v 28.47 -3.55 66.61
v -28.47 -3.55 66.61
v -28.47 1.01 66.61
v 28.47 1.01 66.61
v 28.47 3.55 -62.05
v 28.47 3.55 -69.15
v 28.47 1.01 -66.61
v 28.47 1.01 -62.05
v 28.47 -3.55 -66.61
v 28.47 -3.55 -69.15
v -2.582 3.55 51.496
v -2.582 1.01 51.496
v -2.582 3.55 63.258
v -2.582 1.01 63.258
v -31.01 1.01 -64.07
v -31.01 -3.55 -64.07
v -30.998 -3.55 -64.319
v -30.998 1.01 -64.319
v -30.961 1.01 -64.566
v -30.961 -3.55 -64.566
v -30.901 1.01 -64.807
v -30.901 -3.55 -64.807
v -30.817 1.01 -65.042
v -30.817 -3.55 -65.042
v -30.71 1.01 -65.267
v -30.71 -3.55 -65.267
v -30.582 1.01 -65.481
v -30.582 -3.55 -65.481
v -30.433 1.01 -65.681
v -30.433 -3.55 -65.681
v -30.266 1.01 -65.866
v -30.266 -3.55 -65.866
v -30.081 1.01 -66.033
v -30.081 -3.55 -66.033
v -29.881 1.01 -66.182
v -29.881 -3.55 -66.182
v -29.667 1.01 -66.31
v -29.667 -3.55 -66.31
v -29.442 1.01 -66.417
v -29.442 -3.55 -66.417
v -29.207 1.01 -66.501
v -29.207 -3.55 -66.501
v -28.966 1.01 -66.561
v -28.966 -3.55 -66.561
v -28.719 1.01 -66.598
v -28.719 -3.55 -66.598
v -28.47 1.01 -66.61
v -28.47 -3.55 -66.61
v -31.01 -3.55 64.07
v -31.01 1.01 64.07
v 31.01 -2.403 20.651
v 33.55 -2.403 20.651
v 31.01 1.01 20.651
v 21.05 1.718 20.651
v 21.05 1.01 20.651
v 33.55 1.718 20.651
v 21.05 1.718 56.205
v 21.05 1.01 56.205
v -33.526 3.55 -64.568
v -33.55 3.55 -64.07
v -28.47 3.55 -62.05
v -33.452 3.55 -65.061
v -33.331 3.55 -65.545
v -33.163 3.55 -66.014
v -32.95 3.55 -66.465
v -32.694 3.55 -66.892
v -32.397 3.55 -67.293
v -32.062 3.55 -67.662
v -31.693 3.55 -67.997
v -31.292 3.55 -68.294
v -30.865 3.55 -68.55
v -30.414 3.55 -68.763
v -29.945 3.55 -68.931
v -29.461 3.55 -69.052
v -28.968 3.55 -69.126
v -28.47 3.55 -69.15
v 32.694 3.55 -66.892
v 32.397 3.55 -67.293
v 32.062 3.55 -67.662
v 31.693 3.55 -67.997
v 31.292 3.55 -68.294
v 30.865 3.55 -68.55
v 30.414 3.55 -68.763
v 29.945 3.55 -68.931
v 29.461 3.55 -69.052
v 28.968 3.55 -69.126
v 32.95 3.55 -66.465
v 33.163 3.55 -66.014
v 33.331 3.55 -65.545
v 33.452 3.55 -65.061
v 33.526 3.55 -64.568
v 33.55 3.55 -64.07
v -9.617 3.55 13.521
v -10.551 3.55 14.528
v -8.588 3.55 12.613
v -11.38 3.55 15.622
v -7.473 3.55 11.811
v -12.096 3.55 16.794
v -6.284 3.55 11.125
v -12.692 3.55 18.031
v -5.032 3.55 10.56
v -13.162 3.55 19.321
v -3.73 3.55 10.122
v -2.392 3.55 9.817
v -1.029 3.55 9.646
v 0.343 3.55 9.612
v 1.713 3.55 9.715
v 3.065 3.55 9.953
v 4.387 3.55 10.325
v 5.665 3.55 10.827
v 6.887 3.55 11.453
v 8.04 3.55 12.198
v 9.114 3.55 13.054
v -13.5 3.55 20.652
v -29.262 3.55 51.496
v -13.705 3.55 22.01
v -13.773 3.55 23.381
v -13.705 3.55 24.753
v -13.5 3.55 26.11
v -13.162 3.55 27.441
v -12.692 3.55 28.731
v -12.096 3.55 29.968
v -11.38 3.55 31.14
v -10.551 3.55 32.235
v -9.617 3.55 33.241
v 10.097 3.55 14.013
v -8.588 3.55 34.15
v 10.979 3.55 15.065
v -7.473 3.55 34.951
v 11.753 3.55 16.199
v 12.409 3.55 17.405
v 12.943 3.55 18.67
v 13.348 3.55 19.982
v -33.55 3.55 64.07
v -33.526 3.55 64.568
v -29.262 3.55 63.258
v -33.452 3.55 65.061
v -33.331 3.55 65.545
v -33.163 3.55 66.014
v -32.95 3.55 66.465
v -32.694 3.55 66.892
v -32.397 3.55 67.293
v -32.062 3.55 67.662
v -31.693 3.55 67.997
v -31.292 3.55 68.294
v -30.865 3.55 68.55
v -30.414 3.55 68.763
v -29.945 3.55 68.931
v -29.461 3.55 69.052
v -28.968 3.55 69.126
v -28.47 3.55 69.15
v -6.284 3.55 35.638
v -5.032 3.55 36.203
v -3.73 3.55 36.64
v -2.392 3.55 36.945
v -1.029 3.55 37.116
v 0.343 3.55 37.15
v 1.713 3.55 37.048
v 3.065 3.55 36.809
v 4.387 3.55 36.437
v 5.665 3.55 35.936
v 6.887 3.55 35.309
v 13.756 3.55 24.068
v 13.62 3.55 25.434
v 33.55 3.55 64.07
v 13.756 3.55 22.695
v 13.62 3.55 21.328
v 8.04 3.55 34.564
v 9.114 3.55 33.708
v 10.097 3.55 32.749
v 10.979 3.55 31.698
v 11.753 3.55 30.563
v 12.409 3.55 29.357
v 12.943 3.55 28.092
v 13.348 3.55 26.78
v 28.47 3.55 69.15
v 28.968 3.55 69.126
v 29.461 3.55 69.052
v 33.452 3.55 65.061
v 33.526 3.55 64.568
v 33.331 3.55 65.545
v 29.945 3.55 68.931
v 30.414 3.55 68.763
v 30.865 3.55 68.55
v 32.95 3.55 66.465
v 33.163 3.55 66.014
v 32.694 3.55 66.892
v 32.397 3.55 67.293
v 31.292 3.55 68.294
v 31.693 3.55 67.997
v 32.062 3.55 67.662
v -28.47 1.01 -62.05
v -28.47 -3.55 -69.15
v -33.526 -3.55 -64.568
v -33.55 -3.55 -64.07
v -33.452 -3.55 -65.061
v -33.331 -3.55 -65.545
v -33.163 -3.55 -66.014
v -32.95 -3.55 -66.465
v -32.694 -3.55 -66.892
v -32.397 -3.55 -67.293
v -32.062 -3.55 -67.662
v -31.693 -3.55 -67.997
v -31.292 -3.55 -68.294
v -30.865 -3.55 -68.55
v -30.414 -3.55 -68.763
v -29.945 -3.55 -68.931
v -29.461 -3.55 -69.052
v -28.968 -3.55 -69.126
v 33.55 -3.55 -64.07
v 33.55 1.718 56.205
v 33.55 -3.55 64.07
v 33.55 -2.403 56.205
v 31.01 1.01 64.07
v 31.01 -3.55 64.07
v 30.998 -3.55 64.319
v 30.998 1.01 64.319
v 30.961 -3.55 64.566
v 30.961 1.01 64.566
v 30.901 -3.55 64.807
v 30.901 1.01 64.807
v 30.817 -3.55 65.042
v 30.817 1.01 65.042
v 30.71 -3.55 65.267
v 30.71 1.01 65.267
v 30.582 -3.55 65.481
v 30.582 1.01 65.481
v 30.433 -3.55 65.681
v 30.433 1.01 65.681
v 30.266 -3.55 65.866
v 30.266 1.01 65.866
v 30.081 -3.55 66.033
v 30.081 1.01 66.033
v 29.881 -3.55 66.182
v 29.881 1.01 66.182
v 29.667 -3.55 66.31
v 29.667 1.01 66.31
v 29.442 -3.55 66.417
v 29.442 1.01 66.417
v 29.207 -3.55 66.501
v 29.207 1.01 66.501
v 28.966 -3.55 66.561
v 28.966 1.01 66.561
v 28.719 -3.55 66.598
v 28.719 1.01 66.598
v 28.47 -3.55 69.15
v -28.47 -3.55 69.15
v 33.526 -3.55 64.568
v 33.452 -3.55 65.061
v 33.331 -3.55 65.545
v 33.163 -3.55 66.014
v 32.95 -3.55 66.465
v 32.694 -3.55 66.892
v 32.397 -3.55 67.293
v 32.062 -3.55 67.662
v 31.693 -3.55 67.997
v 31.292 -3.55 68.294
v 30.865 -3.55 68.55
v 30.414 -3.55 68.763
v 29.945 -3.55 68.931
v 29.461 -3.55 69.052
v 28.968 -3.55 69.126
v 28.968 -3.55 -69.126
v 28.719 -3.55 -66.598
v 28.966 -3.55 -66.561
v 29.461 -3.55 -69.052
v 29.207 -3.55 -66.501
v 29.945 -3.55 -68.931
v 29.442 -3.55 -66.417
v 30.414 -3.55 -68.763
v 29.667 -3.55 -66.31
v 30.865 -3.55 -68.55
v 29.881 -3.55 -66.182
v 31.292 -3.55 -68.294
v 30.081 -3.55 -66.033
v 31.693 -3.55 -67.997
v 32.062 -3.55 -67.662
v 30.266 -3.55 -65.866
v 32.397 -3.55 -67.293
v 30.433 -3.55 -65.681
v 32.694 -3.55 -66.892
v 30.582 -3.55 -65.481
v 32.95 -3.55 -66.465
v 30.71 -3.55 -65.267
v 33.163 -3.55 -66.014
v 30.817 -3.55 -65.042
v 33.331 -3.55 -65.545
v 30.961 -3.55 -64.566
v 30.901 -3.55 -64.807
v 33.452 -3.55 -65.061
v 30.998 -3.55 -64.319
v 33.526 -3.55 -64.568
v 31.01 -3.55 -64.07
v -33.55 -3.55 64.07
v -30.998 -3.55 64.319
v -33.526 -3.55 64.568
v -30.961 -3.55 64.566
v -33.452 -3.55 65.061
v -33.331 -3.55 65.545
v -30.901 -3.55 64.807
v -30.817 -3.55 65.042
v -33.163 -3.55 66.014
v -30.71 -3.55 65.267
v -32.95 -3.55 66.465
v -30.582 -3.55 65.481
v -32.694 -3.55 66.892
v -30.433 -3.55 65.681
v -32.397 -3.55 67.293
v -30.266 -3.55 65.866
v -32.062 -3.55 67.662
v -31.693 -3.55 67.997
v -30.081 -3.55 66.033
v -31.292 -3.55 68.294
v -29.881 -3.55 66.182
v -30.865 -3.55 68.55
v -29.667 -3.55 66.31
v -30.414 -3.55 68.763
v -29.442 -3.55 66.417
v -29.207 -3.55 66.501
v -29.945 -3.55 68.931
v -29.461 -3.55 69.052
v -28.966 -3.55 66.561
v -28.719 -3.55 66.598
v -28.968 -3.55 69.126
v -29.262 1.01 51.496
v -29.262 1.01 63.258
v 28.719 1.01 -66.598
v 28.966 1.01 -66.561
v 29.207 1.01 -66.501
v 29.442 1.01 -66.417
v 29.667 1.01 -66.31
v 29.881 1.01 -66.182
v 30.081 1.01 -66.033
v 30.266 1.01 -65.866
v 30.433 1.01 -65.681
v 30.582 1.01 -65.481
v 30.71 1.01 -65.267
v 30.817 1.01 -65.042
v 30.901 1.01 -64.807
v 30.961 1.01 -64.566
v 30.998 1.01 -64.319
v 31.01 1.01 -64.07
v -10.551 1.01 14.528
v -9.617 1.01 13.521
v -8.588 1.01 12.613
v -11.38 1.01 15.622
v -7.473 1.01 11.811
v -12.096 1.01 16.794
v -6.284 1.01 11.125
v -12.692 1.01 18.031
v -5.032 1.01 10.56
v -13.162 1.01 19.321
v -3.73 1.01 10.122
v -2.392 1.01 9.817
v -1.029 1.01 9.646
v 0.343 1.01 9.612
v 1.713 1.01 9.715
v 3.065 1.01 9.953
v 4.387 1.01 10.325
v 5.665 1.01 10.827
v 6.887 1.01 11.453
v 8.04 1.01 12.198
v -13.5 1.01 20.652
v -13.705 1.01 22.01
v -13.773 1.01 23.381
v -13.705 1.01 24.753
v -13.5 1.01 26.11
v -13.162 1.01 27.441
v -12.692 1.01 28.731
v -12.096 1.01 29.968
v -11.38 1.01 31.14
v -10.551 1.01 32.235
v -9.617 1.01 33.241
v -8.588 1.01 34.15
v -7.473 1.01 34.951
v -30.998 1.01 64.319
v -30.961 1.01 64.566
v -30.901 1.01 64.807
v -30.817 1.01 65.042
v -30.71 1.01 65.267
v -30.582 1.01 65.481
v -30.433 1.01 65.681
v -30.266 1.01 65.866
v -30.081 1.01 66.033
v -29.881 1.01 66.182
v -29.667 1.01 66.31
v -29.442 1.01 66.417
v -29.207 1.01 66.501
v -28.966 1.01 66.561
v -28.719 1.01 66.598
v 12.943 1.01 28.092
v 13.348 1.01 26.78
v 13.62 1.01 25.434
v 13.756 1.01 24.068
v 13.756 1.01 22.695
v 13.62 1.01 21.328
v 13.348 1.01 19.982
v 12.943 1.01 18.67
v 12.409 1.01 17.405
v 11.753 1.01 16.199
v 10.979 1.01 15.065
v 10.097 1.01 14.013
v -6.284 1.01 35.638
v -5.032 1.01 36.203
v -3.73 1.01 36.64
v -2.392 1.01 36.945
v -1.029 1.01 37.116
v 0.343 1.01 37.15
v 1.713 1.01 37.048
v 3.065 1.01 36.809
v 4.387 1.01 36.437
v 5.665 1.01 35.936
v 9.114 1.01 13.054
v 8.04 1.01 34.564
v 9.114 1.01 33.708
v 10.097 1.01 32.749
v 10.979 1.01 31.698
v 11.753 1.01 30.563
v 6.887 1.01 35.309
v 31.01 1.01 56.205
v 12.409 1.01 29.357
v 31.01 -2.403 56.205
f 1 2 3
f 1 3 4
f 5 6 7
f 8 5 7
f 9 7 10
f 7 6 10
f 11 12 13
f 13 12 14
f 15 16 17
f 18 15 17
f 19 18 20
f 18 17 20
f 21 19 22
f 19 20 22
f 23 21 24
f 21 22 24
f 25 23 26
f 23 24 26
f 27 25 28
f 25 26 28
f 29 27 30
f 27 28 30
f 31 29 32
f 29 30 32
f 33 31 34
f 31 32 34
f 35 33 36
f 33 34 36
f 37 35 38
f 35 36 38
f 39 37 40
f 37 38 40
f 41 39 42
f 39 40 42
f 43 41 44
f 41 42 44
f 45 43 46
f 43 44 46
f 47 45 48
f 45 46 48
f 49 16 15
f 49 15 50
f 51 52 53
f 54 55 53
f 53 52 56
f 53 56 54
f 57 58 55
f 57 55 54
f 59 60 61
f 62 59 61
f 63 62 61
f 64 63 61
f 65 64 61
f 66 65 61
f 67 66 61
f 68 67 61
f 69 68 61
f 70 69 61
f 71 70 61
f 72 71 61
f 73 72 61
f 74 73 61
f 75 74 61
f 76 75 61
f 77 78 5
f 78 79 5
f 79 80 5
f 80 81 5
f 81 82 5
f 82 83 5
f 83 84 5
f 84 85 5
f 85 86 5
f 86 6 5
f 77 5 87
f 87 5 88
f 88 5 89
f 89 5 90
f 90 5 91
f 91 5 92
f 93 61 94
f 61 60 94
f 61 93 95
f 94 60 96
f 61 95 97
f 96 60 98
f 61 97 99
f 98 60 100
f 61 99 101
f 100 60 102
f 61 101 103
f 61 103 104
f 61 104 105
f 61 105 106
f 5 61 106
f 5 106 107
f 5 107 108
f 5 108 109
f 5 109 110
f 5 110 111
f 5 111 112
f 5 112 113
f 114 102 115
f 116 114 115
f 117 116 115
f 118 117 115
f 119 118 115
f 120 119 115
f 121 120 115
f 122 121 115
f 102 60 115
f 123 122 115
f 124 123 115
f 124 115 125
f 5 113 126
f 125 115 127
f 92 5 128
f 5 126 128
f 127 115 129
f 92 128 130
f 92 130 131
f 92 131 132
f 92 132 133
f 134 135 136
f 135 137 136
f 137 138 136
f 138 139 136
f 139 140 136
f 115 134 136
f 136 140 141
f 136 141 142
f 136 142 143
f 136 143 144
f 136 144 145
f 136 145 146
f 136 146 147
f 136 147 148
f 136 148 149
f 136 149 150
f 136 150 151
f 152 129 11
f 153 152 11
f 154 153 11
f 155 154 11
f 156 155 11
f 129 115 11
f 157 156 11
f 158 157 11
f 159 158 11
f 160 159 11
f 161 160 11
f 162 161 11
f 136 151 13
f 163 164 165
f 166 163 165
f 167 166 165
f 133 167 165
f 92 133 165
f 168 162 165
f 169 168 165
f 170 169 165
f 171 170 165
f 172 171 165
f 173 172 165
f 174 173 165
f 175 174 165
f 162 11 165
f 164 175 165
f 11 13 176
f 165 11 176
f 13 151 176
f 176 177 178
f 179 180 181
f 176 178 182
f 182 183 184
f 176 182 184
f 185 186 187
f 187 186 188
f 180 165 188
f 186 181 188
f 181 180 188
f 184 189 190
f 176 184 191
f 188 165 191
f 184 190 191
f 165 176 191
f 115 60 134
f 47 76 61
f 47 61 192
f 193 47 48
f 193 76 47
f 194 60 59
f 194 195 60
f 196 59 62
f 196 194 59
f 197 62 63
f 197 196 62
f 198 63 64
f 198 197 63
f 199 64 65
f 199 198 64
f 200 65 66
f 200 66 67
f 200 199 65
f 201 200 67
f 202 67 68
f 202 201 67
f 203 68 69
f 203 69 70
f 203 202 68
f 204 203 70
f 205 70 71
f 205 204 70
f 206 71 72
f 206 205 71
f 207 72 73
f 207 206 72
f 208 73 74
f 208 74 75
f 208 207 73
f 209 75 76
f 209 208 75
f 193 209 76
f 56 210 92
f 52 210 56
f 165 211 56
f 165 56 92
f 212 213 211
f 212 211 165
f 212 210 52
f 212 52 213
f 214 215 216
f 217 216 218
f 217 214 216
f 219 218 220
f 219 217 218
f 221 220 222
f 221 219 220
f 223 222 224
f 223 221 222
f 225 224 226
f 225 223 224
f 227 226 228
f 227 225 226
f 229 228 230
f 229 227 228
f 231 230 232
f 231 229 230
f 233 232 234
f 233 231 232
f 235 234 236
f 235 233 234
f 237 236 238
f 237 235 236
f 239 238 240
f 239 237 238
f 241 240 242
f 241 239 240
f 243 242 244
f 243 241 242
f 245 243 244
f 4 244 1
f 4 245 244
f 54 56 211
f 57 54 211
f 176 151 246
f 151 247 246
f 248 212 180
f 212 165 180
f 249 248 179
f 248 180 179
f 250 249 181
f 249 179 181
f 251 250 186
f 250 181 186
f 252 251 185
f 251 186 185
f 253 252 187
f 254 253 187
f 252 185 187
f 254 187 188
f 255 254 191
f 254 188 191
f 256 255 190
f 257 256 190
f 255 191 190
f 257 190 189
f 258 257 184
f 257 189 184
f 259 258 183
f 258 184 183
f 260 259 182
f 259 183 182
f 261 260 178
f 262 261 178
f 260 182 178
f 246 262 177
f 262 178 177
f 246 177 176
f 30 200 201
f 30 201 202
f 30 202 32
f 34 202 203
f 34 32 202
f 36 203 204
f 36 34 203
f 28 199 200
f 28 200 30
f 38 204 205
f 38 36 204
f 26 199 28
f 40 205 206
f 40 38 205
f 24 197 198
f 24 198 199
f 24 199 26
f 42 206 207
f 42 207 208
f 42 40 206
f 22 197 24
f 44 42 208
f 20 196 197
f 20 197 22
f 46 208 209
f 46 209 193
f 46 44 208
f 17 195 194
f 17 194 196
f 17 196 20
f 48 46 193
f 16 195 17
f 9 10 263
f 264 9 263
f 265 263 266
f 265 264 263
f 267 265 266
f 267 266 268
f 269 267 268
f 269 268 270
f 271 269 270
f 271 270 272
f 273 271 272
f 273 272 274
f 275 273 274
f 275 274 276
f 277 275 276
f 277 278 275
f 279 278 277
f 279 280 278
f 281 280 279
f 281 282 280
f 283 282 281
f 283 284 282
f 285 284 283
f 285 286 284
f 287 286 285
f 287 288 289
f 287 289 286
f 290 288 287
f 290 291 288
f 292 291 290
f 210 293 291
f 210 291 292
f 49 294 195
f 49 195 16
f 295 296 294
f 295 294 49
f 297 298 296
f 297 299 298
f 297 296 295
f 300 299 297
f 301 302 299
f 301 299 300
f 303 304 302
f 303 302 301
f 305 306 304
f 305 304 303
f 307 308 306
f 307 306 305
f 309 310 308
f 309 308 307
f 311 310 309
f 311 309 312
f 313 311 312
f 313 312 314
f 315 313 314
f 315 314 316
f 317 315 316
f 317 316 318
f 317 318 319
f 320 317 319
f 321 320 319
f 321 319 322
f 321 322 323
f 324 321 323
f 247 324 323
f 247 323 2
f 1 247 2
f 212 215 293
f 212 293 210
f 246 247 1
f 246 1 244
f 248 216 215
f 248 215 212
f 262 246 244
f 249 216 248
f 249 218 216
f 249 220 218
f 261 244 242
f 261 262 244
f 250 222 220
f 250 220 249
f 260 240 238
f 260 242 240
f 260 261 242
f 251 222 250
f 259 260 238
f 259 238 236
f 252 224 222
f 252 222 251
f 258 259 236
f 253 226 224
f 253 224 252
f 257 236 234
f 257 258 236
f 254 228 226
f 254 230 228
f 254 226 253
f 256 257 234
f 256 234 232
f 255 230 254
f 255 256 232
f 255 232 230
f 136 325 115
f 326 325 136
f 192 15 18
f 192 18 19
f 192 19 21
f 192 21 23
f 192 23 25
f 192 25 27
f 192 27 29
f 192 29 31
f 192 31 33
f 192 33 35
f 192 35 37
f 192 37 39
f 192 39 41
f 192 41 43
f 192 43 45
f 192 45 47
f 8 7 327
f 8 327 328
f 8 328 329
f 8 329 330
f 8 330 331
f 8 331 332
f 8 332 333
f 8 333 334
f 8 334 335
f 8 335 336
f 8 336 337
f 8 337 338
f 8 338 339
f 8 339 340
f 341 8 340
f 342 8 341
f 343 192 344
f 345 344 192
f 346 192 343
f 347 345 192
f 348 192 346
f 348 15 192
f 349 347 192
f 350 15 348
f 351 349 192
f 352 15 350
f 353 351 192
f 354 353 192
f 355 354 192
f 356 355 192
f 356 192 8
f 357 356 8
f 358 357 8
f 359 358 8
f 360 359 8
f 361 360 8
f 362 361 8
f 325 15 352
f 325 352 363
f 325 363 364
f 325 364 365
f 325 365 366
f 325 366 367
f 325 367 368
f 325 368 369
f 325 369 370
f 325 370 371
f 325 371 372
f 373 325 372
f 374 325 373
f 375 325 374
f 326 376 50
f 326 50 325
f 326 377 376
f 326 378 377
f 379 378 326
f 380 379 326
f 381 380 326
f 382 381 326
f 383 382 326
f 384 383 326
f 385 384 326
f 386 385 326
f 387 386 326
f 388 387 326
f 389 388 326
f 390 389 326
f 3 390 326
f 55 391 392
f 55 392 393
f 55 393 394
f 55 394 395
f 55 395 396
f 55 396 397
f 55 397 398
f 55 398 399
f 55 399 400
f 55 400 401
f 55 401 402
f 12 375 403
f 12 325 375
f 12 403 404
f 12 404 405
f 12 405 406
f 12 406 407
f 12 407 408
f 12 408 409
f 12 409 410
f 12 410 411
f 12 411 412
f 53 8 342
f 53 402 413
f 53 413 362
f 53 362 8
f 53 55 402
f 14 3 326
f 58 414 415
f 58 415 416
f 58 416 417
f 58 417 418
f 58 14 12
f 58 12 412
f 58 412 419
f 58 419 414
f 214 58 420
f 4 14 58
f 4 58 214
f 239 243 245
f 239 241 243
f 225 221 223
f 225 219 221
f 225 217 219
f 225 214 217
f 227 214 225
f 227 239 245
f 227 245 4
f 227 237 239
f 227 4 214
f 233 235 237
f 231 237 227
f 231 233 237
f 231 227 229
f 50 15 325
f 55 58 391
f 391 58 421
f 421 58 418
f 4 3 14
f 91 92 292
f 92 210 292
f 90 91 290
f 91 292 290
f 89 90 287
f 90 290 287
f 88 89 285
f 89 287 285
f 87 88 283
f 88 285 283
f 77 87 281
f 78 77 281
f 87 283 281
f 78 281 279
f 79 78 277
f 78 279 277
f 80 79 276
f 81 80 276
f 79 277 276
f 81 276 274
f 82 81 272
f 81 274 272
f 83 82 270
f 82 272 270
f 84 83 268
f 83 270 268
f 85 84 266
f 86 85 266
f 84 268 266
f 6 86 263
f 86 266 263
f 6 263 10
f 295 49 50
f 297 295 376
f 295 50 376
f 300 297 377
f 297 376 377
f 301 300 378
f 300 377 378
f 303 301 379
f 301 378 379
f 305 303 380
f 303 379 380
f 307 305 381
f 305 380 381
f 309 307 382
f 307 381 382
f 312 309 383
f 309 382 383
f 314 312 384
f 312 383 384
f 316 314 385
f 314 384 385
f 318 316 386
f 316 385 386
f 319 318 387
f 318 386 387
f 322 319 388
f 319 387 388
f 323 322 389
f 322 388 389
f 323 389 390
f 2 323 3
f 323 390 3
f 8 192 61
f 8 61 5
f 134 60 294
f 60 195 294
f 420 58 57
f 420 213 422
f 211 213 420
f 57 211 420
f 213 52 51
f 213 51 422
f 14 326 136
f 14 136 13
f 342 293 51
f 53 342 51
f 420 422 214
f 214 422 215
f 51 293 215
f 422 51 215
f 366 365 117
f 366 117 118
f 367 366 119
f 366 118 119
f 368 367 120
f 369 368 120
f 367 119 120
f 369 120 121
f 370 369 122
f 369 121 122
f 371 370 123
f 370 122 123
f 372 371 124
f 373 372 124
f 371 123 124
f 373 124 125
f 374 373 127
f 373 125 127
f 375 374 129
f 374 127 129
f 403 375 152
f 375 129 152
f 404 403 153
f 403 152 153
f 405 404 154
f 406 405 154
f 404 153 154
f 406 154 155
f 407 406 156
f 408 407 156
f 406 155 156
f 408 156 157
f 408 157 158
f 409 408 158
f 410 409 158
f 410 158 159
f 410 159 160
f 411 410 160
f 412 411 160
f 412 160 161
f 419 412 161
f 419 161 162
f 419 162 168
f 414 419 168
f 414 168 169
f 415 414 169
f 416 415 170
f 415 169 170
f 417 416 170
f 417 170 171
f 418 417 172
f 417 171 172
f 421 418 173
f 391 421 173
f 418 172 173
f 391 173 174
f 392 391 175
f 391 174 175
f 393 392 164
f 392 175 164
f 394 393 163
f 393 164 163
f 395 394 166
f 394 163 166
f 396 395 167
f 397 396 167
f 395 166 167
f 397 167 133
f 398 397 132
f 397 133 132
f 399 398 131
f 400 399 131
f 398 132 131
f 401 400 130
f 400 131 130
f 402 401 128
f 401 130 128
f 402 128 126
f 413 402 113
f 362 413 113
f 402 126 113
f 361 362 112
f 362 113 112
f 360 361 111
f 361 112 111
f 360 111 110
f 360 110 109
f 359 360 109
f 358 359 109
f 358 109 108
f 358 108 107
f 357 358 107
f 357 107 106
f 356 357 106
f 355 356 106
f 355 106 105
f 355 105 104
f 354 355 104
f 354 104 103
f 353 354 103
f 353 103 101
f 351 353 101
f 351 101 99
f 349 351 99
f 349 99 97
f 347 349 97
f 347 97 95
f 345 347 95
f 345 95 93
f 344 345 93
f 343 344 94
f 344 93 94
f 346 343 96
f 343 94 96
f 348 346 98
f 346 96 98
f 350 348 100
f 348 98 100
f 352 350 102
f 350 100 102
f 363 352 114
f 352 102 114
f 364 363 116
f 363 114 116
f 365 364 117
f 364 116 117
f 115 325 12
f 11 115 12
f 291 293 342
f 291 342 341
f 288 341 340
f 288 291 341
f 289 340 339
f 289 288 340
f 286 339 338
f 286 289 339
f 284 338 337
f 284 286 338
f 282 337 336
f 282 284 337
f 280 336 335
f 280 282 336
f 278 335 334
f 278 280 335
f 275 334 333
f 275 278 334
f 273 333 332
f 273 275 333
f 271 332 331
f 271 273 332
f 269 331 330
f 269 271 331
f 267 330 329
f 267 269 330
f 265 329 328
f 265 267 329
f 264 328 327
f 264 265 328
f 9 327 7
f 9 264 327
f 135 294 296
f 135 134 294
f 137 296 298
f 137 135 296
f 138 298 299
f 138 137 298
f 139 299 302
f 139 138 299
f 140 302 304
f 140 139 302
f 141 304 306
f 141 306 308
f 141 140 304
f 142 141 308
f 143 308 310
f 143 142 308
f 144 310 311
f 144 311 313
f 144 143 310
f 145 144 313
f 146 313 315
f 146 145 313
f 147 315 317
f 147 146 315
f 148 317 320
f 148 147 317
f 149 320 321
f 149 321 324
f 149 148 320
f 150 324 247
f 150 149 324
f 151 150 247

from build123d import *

# Parameters (mm, degrees)
F0_W      = 67.1
F0_H      = 138.3
F1_DEPTH  = 3.55
F2_R      = 5.08
F3_T      = -2.54
F1_FACE_W = 56.94
F1_FACE_H = 7.1
F4_DEPTH  = 7.1
F5_W      = 26.680329
F5_H      = 11.762295
F6_DEPTH  = 25
F7_R      = 13.773482
F8_DEPTH  = 12.5
F9_W      = 4.120178
F9_H      = 35.554205
F10_DEPTH = 12.5


with BuildPart() as f1:
    # F0 (on Front) → F1 (new body, symmetric)
    with BuildSketch(Plane.XZ):
        Rectangle(F0_W, F0_H)
    extrude(amount=F1_DEPTH, both=True)

    # F2
    f2_edges = [f1.edges().sort_by_distance(p)[0] for p in [
        (33.55, 0, 69.15),
        (-33.55, 0, 69.15),
        (-33.55, 0, -69.15),
        (33.55, 0, -69.15),
    ]]
    fillet(f2_edges, radius=F2_R)

    # F3
    f3_openings = [f1.faces().sort_by_distance(p)[0] for p in [
        (0, -3.55, 0),
    ]]
    offset(amount=F3_T, openings=f3_openings)

    # F1_face (on face) → F4 (cut)
    with BuildSketch(Plane(origin=(0, 0, -69.15), x_dir=(1, 0, 0), z_dir=(0, 0, -1))):
        Rectangle(F1_FACE_W, F1_FACE_H)
    extrude(amount=-F4_DEPTH, mode=Mode.SUBTRACT)

    # F5 (on Front) → F6 (cut)
    with BuildSketch(Plane.XZ):
        with Locations((-15.922133, 57.377054)):
            Rectangle(F5_W, F5_H)
    extrude(amount=-F6_DEPTH, mode=Mode.SUBTRACT)

    # F7 (on face) → F8 (cut, symmetric)
    with BuildSketch(Plane(origin=(0, 3.55, 0), x_dir=(-1, 0, 0), z_dir=(0, 1, 0))):
        with Locations((0, 23.381149)):
            Circle(F7_R)
    extrude(amount=F8_DEPTH, both=True, mode=Mode.SUBTRACT)

    # F9 (on face) → F10 (cut, symmetric)
    with BuildSketch(Plane.YZ.offset(33.55)):
        with Locations((-0.342509, 38.427914)):
            Rectangle(F9_W, F9_H)
    extrude(amount=F10_DEPTH, both=True, mode=Mode.SUBTRACT)


solid = f1.part
